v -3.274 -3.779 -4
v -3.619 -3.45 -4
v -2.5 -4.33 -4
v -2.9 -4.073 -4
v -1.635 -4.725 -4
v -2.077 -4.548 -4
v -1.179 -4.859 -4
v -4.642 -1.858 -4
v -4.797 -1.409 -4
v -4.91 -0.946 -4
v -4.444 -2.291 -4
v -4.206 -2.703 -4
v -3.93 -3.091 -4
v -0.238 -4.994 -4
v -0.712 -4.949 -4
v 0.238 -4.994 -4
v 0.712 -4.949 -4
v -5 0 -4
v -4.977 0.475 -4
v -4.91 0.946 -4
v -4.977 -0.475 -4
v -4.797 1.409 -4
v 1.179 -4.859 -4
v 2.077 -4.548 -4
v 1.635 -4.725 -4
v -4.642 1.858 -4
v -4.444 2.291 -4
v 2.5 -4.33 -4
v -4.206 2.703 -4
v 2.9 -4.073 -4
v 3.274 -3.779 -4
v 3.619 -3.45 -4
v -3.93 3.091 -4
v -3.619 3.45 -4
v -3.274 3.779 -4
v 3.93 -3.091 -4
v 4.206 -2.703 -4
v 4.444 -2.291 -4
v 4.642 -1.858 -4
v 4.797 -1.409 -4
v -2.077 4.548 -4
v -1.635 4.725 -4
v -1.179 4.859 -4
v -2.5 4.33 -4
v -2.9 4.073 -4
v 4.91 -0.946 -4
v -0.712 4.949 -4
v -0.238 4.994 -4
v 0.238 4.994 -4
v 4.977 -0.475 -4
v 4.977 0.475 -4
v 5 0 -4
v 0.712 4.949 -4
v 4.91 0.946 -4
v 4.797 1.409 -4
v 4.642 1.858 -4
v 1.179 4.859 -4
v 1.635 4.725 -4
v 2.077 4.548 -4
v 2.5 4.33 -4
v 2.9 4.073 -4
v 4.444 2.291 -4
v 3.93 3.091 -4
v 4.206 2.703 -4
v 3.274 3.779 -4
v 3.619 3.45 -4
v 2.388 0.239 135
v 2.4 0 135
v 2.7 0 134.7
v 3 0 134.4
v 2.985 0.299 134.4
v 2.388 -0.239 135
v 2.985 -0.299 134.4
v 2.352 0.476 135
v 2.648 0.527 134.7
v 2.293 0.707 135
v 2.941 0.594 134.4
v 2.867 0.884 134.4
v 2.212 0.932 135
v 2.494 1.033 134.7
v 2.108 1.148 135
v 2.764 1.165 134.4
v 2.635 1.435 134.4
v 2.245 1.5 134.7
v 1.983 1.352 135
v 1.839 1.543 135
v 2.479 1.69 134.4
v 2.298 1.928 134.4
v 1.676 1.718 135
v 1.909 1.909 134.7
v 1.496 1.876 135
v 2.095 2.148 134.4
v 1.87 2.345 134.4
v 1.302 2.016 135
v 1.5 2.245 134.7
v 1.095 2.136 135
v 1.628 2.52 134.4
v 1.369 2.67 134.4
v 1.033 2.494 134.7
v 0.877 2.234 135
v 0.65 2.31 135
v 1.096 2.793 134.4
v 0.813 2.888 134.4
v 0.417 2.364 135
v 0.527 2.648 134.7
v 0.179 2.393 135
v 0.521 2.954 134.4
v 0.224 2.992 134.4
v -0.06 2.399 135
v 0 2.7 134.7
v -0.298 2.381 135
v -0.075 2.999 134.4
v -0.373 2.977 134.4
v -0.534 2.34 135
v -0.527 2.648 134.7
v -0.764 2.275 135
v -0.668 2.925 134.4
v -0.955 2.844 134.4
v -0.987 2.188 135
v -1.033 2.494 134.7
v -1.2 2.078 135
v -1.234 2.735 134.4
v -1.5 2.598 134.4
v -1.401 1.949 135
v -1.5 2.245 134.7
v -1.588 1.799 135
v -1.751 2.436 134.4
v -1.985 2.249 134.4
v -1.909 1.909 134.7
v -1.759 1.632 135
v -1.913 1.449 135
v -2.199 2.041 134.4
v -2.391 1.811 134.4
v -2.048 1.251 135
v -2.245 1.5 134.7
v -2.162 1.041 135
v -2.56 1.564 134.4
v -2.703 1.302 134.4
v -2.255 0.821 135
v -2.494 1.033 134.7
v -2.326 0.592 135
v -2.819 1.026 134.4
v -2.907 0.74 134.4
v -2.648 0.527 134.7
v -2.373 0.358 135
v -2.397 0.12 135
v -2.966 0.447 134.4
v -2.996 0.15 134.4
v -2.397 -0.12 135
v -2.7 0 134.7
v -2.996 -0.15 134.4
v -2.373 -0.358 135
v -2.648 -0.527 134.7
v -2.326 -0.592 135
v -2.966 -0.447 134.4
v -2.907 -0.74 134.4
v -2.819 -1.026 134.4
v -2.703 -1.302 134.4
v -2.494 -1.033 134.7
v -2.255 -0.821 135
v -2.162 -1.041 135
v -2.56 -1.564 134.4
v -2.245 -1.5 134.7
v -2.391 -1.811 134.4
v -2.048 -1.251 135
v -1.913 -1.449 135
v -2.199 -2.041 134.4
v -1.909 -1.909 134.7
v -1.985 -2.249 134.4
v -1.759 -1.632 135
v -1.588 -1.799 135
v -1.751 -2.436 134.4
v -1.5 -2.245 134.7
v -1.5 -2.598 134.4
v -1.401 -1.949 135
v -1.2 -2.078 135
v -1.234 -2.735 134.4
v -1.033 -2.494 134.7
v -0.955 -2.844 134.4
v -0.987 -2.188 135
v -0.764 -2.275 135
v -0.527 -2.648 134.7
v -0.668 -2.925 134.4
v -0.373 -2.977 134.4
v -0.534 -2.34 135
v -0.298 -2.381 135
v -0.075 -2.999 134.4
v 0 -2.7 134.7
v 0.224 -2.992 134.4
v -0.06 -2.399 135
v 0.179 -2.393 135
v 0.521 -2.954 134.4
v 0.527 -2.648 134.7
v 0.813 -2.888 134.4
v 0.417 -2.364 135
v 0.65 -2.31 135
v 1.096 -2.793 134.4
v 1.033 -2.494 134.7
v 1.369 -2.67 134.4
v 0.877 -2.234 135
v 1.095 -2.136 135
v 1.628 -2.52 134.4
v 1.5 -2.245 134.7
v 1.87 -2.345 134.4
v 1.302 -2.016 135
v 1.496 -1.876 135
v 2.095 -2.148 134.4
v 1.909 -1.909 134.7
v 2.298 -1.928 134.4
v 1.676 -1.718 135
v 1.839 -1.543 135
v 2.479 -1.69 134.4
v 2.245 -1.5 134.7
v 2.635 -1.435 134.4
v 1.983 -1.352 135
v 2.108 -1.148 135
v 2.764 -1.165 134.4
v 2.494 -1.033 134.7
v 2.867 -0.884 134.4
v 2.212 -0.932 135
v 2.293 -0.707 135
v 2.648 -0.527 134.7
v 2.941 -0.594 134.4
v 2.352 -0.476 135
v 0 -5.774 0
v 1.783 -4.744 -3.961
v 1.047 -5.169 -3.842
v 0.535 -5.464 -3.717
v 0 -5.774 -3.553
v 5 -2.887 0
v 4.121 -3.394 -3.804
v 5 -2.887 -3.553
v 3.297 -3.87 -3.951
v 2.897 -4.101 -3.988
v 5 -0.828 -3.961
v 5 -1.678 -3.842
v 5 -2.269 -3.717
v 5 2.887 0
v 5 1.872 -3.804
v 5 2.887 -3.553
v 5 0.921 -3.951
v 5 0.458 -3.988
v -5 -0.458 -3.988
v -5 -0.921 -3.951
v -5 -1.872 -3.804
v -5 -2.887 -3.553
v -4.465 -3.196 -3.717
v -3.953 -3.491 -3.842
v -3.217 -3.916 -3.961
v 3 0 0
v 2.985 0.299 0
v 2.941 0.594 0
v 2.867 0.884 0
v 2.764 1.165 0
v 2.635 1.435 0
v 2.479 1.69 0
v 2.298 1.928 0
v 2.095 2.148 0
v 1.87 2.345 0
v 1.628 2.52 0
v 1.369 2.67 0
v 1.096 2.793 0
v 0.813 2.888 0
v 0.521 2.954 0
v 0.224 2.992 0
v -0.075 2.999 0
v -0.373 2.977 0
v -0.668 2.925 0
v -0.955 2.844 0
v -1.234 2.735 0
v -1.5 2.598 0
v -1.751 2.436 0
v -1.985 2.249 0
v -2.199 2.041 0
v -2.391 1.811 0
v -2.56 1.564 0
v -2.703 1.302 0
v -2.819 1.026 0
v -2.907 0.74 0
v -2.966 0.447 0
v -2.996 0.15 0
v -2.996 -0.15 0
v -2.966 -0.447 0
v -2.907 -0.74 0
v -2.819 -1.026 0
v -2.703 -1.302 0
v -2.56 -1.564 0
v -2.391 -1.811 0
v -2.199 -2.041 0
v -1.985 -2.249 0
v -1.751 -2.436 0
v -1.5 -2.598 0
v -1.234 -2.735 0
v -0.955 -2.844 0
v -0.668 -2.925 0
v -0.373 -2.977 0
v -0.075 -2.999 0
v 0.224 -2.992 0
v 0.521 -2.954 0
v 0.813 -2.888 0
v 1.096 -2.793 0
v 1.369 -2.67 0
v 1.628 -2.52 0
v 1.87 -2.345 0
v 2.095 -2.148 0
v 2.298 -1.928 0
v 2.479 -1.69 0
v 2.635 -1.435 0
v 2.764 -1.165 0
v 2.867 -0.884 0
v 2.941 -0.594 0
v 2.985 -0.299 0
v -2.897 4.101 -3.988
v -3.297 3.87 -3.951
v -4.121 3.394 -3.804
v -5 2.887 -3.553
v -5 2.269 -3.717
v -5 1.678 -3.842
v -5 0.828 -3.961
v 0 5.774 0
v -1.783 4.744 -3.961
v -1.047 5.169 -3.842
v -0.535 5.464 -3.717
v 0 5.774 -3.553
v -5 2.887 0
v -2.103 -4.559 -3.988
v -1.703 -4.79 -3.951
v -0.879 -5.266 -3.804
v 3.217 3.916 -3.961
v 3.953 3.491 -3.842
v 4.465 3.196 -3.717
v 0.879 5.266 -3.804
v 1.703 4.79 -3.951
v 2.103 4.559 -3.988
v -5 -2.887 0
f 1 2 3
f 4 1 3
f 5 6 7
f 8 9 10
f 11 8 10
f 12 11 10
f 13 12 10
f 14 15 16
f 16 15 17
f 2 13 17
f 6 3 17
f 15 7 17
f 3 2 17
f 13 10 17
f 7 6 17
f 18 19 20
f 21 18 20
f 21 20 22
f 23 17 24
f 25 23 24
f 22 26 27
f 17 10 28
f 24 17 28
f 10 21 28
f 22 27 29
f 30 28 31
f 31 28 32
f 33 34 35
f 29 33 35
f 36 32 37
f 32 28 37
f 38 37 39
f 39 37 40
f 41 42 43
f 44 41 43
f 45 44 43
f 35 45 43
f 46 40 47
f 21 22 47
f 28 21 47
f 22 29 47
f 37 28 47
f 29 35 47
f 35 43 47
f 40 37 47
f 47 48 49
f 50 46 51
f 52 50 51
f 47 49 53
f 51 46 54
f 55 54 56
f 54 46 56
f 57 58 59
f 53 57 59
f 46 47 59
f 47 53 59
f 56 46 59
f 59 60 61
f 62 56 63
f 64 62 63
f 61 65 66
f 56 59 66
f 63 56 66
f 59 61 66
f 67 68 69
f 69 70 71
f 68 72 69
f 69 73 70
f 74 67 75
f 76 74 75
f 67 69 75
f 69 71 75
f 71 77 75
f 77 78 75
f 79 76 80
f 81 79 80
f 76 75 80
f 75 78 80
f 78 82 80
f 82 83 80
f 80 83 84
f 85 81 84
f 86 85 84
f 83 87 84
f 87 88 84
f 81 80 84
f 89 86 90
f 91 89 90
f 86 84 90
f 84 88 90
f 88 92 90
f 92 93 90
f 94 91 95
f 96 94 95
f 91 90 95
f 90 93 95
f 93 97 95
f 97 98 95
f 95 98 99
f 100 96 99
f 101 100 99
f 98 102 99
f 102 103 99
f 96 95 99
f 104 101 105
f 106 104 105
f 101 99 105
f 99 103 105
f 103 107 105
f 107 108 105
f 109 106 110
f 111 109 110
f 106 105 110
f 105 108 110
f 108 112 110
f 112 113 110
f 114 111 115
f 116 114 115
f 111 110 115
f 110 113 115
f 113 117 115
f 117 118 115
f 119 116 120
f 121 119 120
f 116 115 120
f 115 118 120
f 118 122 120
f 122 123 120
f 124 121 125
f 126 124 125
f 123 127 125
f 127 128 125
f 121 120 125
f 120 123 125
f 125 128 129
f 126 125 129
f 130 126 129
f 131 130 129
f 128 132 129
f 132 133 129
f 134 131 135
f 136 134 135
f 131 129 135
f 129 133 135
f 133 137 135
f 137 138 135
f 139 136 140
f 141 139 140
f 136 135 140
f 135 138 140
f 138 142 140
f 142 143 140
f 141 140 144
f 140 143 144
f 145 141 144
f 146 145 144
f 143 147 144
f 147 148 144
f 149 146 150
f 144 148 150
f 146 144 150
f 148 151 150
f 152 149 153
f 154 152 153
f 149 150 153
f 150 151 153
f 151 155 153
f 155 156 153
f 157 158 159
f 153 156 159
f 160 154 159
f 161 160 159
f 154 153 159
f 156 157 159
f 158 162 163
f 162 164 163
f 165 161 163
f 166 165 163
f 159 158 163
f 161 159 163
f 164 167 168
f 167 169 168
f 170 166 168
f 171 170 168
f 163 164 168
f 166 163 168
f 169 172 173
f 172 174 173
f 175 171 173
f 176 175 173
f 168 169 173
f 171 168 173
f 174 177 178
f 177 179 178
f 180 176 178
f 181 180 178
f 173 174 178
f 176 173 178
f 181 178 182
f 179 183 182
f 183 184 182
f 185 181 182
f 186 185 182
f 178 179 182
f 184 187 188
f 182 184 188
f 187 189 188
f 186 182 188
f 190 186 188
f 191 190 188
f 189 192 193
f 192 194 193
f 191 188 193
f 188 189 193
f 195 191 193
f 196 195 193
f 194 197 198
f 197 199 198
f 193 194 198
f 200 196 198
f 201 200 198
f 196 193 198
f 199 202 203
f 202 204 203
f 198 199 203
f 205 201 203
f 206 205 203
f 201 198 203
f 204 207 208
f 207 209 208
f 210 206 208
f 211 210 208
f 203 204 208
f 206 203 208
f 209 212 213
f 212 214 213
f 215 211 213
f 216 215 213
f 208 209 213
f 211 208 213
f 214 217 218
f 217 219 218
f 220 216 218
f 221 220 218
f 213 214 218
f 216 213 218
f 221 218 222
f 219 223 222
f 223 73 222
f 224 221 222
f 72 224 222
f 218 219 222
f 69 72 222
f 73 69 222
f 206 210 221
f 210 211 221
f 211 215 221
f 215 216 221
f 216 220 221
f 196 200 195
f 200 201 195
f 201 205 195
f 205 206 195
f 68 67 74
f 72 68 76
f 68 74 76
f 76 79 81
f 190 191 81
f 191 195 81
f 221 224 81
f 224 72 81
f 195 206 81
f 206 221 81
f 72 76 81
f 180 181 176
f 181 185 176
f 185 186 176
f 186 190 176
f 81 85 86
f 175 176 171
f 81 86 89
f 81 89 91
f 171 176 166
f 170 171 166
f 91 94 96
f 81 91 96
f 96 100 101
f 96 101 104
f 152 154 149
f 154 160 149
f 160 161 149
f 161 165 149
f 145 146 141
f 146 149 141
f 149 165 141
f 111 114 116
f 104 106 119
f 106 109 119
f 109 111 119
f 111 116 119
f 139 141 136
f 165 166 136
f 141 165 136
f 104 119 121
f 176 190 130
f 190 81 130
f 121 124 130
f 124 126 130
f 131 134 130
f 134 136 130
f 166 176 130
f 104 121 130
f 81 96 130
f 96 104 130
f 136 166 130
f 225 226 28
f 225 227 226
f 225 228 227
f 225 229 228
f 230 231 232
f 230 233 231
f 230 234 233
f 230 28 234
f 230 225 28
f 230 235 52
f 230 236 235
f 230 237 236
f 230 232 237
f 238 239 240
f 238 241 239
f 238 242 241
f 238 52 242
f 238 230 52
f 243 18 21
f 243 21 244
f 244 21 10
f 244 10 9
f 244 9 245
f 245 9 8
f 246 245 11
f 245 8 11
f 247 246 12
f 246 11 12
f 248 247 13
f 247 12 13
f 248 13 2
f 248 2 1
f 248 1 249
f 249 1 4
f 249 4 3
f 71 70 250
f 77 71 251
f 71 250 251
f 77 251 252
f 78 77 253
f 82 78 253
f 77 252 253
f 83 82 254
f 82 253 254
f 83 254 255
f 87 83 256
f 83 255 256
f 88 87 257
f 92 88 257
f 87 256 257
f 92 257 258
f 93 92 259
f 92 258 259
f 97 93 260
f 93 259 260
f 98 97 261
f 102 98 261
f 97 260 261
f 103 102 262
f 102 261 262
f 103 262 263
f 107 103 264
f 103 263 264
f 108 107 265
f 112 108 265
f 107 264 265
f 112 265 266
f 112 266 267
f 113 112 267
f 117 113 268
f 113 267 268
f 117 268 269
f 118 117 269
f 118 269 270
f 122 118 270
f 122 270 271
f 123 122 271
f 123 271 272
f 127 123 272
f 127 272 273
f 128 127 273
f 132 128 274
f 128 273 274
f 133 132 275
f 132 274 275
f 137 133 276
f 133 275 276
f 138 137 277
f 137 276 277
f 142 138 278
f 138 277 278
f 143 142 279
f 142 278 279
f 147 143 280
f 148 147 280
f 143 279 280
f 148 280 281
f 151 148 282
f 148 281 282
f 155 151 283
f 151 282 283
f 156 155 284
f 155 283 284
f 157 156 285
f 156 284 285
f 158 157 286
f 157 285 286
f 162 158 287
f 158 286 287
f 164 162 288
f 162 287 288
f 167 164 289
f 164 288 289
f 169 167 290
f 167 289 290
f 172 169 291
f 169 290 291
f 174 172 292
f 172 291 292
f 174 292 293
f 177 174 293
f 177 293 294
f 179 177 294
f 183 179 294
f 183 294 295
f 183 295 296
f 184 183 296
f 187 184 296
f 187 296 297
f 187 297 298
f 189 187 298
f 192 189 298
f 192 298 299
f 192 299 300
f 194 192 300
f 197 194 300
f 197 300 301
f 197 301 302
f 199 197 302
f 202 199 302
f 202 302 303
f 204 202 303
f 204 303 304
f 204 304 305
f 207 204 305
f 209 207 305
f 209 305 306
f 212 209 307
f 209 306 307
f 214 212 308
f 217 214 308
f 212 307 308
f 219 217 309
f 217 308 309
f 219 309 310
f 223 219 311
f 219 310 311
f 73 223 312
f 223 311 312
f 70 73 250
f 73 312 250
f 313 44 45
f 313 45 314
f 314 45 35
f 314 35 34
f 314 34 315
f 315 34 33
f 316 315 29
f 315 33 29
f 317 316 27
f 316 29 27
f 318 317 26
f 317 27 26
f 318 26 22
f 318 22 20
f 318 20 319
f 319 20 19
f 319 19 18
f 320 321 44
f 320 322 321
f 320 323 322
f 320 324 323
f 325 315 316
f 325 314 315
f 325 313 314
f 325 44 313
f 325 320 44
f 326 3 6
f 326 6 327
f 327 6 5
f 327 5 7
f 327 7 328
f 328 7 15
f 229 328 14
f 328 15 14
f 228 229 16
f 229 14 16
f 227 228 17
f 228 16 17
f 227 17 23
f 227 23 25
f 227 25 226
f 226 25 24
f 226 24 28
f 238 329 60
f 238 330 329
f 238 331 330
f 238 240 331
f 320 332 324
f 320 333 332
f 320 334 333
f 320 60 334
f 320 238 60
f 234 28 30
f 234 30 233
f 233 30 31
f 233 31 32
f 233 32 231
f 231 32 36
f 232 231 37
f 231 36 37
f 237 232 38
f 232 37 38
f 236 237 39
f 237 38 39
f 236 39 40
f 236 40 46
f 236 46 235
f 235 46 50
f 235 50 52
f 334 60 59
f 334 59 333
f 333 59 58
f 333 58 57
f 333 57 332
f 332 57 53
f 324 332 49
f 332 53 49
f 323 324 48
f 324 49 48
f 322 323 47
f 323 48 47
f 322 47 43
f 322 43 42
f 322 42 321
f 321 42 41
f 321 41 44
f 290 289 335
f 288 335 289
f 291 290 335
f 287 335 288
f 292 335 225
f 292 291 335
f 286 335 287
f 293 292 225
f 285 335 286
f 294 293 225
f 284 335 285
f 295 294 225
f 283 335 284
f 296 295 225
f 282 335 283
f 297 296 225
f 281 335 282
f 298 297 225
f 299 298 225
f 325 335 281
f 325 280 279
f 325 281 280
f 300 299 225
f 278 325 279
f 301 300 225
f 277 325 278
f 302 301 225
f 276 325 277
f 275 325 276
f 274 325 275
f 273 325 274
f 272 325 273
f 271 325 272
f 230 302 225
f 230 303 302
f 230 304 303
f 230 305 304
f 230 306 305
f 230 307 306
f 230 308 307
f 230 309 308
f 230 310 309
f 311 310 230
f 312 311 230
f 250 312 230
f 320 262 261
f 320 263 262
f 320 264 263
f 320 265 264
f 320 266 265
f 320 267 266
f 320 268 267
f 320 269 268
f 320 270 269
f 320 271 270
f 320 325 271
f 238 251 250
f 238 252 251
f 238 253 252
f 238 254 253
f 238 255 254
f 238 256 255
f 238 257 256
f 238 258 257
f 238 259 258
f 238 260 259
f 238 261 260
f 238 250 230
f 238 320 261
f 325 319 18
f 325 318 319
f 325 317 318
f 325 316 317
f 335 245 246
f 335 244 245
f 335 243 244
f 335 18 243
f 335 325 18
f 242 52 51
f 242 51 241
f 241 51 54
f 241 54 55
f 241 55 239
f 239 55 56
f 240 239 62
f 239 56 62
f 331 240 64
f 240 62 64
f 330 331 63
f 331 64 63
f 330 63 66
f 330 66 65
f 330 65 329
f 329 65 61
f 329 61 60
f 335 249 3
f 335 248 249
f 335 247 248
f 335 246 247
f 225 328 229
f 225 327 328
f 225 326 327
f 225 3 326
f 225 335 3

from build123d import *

# Parameters (mm, degrees)
ESQUISSE1_W        = 3
ESQUISSE1_H        = 135
BOSS_EXTRU_1_DEPTH = 4


with BuildPart() as part:
    # Esquisse1 → Base-Révolution (revolve)
    with BuildSketch(Plane(origin=(0, 0, 0), x_dir=(1, 0, 0), z_dir=(0, 1, 0))):
        with Locations((1.5, -67.5)):
            Rectangle(ESQUISSE1_W, ESQUISSE1_H)
    revolve(axis=Axis((0, 0, 0), (0, 0, 1)))

    # Chanfrein1: read off the stored shape, not the designer's step
    # Chanfrein1 outline → Chanfrein1 (revolve, cut)
    with BuildSketch(Plane.XZ):
        Polygon((3, 135), (2.4, 135), (3, 134.4), align=None)
    revolve(axis=Axis((0, 0, 0), (0, 0, 1)), mode=Mode.SUBTRACT)

    # Esquisse6 → Boss.-Extru.1 (add)
    with BuildSketch(Plane.XY):
        Polygon((5, -2.886751346), (5, 2.886751346), (0, 5.773502692), (-5, 2.886751346), (-5, -2.886751346), (0, -5.773502692), align=None)
    extrude(amount=-BOSS_EXTRU_1_DEPTH)

    # Esquisse7 → Enlèvement de matière-Révolution1 (revolve, cut)
    with BuildSketch(Plane(origin=(0, 0, 0), x_dir=(1, 0, 0), z_dir=(0, 1, 0))):
        Polygon((-5, 4), (-11.92820323, 4), (-11.92820323, 0), align=None)
    revolve(axis=Axis((0, 0, -6.239446496), (0, 0, 1)), mode=Mode.SUBTRACT)


solid = part.part
